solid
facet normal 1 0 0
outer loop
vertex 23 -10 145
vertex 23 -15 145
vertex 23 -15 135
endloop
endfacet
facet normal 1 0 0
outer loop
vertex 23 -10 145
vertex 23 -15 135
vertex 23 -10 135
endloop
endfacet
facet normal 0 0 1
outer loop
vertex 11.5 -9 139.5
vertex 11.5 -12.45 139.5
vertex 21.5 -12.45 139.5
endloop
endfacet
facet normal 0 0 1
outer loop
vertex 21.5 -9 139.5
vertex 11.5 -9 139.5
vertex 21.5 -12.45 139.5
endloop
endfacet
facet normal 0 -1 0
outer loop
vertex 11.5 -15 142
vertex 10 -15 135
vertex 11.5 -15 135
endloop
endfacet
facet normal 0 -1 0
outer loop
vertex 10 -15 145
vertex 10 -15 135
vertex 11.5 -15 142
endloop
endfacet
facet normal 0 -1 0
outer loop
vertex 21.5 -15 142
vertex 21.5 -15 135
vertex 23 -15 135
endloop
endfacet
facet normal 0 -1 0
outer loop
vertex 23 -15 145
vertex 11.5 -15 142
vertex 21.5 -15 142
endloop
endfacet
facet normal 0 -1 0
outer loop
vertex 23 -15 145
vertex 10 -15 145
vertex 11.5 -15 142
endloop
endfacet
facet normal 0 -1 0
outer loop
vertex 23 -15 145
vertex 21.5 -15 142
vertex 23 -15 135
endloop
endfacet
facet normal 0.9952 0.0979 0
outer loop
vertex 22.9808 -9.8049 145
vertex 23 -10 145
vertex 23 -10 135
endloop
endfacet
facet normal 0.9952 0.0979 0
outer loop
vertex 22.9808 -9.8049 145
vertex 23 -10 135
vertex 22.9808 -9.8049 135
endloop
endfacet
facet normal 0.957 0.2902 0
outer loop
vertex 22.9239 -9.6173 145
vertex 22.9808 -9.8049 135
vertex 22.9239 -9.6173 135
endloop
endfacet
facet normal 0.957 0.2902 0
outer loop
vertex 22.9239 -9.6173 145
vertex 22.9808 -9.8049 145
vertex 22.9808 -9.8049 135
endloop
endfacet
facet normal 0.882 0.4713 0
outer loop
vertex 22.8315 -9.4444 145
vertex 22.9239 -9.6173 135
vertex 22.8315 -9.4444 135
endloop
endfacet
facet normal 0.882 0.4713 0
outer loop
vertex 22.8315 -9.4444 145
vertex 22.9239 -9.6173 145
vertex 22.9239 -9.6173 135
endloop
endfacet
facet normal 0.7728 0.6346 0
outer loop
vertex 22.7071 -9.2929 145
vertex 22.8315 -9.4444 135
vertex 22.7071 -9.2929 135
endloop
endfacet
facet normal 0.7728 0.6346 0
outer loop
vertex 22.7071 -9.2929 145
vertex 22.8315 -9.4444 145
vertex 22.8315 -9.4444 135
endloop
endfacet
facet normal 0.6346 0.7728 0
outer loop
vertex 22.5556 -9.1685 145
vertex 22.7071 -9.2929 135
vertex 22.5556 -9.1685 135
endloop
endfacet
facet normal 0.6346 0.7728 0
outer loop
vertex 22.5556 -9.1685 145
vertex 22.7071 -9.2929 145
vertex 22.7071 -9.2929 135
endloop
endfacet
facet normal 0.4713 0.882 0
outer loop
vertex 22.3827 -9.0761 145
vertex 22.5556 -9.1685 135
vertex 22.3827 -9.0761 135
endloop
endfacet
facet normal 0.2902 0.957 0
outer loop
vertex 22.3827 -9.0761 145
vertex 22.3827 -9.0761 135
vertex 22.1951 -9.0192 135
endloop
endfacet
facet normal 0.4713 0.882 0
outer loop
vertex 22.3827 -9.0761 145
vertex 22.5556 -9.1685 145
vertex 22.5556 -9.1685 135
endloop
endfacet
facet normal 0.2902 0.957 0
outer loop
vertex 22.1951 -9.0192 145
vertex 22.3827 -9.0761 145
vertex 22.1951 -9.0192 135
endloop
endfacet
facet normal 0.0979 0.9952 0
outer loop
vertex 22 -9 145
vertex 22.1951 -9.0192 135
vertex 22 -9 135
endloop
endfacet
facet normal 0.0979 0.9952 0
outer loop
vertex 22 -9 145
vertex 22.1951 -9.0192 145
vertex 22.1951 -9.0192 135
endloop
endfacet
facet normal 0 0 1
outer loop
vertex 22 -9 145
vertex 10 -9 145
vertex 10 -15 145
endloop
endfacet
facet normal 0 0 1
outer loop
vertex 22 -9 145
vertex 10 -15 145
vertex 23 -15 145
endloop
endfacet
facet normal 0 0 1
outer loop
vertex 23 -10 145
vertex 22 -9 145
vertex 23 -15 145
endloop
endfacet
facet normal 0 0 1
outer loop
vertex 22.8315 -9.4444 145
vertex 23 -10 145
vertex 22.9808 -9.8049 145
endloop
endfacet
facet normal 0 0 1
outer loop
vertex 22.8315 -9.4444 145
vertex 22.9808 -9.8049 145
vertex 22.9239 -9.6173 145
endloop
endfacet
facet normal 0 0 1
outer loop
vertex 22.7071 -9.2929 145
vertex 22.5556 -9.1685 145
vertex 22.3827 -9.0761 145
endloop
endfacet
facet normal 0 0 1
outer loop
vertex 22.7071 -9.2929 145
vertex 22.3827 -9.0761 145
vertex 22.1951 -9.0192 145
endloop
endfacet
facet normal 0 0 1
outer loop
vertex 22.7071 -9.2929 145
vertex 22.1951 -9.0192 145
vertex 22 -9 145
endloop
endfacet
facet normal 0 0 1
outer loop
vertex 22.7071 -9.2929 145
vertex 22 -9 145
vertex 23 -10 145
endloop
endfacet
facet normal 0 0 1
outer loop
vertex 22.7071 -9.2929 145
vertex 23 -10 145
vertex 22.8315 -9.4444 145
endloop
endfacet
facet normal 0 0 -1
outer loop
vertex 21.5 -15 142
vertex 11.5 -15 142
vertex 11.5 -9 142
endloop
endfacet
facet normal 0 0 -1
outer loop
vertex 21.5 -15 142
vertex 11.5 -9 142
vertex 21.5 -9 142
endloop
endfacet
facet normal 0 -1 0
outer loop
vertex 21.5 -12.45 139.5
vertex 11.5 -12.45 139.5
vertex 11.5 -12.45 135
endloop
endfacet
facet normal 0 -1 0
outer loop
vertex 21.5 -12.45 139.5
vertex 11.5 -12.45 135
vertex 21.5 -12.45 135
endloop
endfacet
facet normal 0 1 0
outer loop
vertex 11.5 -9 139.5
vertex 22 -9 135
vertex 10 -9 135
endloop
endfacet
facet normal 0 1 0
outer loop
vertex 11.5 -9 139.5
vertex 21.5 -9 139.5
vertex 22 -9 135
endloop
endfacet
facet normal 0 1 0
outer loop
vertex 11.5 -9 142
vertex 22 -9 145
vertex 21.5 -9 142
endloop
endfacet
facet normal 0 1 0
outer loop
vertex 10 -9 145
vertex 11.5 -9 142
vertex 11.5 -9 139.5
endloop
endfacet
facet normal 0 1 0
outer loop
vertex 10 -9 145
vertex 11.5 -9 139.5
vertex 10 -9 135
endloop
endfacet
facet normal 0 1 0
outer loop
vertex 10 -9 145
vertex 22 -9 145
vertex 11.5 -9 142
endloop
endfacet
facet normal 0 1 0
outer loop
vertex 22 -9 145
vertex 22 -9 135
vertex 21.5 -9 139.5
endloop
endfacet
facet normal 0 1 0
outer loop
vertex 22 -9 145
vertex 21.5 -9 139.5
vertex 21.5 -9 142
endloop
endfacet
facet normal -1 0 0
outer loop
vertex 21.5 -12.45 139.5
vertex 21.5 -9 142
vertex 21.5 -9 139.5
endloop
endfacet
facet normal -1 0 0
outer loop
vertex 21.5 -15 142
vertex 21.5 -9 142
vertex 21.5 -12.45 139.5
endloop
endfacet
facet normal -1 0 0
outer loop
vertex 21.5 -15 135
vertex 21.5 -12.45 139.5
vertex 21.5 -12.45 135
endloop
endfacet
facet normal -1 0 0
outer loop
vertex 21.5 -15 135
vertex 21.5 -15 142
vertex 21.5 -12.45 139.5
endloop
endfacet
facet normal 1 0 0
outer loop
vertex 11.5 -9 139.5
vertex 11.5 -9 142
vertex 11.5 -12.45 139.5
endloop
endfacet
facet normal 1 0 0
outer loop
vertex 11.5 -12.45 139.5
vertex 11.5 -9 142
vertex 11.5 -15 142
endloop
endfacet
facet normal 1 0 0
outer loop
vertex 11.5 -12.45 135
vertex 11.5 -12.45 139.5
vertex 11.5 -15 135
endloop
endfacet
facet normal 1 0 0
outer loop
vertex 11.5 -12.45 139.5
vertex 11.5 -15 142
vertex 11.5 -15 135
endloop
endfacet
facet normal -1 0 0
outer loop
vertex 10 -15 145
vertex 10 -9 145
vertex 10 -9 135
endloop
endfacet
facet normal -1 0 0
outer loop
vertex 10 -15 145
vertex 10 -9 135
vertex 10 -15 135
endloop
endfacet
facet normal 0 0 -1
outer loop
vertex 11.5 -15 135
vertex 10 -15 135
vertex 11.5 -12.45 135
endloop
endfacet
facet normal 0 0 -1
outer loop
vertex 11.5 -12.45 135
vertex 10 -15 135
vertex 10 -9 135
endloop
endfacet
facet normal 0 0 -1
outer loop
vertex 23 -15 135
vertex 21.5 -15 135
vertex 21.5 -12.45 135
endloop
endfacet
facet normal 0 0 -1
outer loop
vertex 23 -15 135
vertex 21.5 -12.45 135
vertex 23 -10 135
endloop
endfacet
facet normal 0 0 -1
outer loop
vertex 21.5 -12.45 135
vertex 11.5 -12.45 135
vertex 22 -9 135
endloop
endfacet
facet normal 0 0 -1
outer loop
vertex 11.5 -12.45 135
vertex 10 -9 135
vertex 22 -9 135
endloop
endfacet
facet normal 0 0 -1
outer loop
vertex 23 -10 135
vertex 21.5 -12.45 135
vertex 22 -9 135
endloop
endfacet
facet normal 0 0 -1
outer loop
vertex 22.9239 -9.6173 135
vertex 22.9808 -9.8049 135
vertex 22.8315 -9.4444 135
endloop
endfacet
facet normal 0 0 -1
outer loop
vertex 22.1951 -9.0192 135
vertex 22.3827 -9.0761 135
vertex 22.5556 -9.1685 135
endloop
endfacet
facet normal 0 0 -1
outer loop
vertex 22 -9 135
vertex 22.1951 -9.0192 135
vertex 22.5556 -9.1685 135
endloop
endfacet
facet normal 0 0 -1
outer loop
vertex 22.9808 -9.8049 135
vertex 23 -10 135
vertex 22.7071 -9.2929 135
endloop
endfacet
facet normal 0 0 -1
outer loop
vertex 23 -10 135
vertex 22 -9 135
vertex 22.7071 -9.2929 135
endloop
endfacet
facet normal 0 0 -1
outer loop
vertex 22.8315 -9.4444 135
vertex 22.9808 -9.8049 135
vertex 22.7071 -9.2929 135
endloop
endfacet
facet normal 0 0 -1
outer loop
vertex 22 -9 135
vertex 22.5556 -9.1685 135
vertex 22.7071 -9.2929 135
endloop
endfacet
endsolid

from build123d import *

# Parameters (mm, degrees)
PAD014_DEPTH    = 10
SKETCH_W        = 10
SKETCH_H        = 2.5
POCKET_DEPTH    = 5
SKETCH029_W     = 13
SKETCH029_H     = 3
PAD015_DEPTH    = 3
SKETCH030_W     = 10
SKETCH030_H     = 7
POCKET002_DEPTH = 1


with BuildPart() as f_10mm_endbrackett:
    # Sketch015 → Pad014 (new body)
    with BuildSketch(Plane.XY):
        with BuildLine():
            Line((10, -9), (10, -15))
            Line((10, -15), (12.625, -15))
            Line((12.625, -15), (12.625, -14.4))
            Line((12.625, -14.4), (11.5, -14.4))
            Line((11.5, -14.4), (11.5, -12.45))
            Line((11.5, -12.45), (21.5, -12.45))
            Line((21.5, -12.45), (21.5, -14.4))
            Line((21.5, -14.4), (20.375, -14.4))
            Line((20.375, -14.4), (20.375, -15))
            Line((20.375, -15), (23, -15))
            Line((23, -15), (23, -10))
            ThreePointArc((23, -10), (22.707107, -9.292893), (22, -9))
            Line((22, -9), (10, -9))
        make_face()
    extrude(amount=PAD014_DEPTH)

    # Sketch (on Face6 of Pad014) → Pocket (cut)
    with BuildSketch(Plane.XZ.offset(12.45)):
        with Locations((16.5, 4.25)):
            Rectangle(SKETCH_W, SKETCH_H)
    extrude(amount=-POCKET_DEPTH, mode=Mode.SUBTRACT)

    # Sketch029 (on Face4 of Pocket) → Pad015 (join)
    with BuildSketch(Plane(origin=(0, 0, 0), x_dir=(1, 0, 0), z_dir=(0, 0, -1))):
        with Locations((16.5, 13.5)):
            Rectangle(SKETCH029_W, SKETCH029_H)
    extrude(amount=-PAD015_DEPTH)

    # Sketch030 (on Face4 of Pad015) → Pocket002 (cut)
    with BuildSketch(Plane.XZ.offset(15)):
        with Locations((16.5, 6.5)):
            Rectangle(SKETCH030_W, SKETCH030_H)
    extrude(amount=-POCKET002_DEPTH, mode=Mode.SUBTRACT)


with BuildPart() as f_10mm_endbracketb:
    # Part__Mirroring: instance of 10mm-EndBracketT
    add(f_10mm_endbrackett.part.mirror(Plane(origin=(0, 0, 72.5), x_dir=(0, 1, 0), z_dir=(0, 0, 1))))


solid = f_10mm_endbracketb.part
